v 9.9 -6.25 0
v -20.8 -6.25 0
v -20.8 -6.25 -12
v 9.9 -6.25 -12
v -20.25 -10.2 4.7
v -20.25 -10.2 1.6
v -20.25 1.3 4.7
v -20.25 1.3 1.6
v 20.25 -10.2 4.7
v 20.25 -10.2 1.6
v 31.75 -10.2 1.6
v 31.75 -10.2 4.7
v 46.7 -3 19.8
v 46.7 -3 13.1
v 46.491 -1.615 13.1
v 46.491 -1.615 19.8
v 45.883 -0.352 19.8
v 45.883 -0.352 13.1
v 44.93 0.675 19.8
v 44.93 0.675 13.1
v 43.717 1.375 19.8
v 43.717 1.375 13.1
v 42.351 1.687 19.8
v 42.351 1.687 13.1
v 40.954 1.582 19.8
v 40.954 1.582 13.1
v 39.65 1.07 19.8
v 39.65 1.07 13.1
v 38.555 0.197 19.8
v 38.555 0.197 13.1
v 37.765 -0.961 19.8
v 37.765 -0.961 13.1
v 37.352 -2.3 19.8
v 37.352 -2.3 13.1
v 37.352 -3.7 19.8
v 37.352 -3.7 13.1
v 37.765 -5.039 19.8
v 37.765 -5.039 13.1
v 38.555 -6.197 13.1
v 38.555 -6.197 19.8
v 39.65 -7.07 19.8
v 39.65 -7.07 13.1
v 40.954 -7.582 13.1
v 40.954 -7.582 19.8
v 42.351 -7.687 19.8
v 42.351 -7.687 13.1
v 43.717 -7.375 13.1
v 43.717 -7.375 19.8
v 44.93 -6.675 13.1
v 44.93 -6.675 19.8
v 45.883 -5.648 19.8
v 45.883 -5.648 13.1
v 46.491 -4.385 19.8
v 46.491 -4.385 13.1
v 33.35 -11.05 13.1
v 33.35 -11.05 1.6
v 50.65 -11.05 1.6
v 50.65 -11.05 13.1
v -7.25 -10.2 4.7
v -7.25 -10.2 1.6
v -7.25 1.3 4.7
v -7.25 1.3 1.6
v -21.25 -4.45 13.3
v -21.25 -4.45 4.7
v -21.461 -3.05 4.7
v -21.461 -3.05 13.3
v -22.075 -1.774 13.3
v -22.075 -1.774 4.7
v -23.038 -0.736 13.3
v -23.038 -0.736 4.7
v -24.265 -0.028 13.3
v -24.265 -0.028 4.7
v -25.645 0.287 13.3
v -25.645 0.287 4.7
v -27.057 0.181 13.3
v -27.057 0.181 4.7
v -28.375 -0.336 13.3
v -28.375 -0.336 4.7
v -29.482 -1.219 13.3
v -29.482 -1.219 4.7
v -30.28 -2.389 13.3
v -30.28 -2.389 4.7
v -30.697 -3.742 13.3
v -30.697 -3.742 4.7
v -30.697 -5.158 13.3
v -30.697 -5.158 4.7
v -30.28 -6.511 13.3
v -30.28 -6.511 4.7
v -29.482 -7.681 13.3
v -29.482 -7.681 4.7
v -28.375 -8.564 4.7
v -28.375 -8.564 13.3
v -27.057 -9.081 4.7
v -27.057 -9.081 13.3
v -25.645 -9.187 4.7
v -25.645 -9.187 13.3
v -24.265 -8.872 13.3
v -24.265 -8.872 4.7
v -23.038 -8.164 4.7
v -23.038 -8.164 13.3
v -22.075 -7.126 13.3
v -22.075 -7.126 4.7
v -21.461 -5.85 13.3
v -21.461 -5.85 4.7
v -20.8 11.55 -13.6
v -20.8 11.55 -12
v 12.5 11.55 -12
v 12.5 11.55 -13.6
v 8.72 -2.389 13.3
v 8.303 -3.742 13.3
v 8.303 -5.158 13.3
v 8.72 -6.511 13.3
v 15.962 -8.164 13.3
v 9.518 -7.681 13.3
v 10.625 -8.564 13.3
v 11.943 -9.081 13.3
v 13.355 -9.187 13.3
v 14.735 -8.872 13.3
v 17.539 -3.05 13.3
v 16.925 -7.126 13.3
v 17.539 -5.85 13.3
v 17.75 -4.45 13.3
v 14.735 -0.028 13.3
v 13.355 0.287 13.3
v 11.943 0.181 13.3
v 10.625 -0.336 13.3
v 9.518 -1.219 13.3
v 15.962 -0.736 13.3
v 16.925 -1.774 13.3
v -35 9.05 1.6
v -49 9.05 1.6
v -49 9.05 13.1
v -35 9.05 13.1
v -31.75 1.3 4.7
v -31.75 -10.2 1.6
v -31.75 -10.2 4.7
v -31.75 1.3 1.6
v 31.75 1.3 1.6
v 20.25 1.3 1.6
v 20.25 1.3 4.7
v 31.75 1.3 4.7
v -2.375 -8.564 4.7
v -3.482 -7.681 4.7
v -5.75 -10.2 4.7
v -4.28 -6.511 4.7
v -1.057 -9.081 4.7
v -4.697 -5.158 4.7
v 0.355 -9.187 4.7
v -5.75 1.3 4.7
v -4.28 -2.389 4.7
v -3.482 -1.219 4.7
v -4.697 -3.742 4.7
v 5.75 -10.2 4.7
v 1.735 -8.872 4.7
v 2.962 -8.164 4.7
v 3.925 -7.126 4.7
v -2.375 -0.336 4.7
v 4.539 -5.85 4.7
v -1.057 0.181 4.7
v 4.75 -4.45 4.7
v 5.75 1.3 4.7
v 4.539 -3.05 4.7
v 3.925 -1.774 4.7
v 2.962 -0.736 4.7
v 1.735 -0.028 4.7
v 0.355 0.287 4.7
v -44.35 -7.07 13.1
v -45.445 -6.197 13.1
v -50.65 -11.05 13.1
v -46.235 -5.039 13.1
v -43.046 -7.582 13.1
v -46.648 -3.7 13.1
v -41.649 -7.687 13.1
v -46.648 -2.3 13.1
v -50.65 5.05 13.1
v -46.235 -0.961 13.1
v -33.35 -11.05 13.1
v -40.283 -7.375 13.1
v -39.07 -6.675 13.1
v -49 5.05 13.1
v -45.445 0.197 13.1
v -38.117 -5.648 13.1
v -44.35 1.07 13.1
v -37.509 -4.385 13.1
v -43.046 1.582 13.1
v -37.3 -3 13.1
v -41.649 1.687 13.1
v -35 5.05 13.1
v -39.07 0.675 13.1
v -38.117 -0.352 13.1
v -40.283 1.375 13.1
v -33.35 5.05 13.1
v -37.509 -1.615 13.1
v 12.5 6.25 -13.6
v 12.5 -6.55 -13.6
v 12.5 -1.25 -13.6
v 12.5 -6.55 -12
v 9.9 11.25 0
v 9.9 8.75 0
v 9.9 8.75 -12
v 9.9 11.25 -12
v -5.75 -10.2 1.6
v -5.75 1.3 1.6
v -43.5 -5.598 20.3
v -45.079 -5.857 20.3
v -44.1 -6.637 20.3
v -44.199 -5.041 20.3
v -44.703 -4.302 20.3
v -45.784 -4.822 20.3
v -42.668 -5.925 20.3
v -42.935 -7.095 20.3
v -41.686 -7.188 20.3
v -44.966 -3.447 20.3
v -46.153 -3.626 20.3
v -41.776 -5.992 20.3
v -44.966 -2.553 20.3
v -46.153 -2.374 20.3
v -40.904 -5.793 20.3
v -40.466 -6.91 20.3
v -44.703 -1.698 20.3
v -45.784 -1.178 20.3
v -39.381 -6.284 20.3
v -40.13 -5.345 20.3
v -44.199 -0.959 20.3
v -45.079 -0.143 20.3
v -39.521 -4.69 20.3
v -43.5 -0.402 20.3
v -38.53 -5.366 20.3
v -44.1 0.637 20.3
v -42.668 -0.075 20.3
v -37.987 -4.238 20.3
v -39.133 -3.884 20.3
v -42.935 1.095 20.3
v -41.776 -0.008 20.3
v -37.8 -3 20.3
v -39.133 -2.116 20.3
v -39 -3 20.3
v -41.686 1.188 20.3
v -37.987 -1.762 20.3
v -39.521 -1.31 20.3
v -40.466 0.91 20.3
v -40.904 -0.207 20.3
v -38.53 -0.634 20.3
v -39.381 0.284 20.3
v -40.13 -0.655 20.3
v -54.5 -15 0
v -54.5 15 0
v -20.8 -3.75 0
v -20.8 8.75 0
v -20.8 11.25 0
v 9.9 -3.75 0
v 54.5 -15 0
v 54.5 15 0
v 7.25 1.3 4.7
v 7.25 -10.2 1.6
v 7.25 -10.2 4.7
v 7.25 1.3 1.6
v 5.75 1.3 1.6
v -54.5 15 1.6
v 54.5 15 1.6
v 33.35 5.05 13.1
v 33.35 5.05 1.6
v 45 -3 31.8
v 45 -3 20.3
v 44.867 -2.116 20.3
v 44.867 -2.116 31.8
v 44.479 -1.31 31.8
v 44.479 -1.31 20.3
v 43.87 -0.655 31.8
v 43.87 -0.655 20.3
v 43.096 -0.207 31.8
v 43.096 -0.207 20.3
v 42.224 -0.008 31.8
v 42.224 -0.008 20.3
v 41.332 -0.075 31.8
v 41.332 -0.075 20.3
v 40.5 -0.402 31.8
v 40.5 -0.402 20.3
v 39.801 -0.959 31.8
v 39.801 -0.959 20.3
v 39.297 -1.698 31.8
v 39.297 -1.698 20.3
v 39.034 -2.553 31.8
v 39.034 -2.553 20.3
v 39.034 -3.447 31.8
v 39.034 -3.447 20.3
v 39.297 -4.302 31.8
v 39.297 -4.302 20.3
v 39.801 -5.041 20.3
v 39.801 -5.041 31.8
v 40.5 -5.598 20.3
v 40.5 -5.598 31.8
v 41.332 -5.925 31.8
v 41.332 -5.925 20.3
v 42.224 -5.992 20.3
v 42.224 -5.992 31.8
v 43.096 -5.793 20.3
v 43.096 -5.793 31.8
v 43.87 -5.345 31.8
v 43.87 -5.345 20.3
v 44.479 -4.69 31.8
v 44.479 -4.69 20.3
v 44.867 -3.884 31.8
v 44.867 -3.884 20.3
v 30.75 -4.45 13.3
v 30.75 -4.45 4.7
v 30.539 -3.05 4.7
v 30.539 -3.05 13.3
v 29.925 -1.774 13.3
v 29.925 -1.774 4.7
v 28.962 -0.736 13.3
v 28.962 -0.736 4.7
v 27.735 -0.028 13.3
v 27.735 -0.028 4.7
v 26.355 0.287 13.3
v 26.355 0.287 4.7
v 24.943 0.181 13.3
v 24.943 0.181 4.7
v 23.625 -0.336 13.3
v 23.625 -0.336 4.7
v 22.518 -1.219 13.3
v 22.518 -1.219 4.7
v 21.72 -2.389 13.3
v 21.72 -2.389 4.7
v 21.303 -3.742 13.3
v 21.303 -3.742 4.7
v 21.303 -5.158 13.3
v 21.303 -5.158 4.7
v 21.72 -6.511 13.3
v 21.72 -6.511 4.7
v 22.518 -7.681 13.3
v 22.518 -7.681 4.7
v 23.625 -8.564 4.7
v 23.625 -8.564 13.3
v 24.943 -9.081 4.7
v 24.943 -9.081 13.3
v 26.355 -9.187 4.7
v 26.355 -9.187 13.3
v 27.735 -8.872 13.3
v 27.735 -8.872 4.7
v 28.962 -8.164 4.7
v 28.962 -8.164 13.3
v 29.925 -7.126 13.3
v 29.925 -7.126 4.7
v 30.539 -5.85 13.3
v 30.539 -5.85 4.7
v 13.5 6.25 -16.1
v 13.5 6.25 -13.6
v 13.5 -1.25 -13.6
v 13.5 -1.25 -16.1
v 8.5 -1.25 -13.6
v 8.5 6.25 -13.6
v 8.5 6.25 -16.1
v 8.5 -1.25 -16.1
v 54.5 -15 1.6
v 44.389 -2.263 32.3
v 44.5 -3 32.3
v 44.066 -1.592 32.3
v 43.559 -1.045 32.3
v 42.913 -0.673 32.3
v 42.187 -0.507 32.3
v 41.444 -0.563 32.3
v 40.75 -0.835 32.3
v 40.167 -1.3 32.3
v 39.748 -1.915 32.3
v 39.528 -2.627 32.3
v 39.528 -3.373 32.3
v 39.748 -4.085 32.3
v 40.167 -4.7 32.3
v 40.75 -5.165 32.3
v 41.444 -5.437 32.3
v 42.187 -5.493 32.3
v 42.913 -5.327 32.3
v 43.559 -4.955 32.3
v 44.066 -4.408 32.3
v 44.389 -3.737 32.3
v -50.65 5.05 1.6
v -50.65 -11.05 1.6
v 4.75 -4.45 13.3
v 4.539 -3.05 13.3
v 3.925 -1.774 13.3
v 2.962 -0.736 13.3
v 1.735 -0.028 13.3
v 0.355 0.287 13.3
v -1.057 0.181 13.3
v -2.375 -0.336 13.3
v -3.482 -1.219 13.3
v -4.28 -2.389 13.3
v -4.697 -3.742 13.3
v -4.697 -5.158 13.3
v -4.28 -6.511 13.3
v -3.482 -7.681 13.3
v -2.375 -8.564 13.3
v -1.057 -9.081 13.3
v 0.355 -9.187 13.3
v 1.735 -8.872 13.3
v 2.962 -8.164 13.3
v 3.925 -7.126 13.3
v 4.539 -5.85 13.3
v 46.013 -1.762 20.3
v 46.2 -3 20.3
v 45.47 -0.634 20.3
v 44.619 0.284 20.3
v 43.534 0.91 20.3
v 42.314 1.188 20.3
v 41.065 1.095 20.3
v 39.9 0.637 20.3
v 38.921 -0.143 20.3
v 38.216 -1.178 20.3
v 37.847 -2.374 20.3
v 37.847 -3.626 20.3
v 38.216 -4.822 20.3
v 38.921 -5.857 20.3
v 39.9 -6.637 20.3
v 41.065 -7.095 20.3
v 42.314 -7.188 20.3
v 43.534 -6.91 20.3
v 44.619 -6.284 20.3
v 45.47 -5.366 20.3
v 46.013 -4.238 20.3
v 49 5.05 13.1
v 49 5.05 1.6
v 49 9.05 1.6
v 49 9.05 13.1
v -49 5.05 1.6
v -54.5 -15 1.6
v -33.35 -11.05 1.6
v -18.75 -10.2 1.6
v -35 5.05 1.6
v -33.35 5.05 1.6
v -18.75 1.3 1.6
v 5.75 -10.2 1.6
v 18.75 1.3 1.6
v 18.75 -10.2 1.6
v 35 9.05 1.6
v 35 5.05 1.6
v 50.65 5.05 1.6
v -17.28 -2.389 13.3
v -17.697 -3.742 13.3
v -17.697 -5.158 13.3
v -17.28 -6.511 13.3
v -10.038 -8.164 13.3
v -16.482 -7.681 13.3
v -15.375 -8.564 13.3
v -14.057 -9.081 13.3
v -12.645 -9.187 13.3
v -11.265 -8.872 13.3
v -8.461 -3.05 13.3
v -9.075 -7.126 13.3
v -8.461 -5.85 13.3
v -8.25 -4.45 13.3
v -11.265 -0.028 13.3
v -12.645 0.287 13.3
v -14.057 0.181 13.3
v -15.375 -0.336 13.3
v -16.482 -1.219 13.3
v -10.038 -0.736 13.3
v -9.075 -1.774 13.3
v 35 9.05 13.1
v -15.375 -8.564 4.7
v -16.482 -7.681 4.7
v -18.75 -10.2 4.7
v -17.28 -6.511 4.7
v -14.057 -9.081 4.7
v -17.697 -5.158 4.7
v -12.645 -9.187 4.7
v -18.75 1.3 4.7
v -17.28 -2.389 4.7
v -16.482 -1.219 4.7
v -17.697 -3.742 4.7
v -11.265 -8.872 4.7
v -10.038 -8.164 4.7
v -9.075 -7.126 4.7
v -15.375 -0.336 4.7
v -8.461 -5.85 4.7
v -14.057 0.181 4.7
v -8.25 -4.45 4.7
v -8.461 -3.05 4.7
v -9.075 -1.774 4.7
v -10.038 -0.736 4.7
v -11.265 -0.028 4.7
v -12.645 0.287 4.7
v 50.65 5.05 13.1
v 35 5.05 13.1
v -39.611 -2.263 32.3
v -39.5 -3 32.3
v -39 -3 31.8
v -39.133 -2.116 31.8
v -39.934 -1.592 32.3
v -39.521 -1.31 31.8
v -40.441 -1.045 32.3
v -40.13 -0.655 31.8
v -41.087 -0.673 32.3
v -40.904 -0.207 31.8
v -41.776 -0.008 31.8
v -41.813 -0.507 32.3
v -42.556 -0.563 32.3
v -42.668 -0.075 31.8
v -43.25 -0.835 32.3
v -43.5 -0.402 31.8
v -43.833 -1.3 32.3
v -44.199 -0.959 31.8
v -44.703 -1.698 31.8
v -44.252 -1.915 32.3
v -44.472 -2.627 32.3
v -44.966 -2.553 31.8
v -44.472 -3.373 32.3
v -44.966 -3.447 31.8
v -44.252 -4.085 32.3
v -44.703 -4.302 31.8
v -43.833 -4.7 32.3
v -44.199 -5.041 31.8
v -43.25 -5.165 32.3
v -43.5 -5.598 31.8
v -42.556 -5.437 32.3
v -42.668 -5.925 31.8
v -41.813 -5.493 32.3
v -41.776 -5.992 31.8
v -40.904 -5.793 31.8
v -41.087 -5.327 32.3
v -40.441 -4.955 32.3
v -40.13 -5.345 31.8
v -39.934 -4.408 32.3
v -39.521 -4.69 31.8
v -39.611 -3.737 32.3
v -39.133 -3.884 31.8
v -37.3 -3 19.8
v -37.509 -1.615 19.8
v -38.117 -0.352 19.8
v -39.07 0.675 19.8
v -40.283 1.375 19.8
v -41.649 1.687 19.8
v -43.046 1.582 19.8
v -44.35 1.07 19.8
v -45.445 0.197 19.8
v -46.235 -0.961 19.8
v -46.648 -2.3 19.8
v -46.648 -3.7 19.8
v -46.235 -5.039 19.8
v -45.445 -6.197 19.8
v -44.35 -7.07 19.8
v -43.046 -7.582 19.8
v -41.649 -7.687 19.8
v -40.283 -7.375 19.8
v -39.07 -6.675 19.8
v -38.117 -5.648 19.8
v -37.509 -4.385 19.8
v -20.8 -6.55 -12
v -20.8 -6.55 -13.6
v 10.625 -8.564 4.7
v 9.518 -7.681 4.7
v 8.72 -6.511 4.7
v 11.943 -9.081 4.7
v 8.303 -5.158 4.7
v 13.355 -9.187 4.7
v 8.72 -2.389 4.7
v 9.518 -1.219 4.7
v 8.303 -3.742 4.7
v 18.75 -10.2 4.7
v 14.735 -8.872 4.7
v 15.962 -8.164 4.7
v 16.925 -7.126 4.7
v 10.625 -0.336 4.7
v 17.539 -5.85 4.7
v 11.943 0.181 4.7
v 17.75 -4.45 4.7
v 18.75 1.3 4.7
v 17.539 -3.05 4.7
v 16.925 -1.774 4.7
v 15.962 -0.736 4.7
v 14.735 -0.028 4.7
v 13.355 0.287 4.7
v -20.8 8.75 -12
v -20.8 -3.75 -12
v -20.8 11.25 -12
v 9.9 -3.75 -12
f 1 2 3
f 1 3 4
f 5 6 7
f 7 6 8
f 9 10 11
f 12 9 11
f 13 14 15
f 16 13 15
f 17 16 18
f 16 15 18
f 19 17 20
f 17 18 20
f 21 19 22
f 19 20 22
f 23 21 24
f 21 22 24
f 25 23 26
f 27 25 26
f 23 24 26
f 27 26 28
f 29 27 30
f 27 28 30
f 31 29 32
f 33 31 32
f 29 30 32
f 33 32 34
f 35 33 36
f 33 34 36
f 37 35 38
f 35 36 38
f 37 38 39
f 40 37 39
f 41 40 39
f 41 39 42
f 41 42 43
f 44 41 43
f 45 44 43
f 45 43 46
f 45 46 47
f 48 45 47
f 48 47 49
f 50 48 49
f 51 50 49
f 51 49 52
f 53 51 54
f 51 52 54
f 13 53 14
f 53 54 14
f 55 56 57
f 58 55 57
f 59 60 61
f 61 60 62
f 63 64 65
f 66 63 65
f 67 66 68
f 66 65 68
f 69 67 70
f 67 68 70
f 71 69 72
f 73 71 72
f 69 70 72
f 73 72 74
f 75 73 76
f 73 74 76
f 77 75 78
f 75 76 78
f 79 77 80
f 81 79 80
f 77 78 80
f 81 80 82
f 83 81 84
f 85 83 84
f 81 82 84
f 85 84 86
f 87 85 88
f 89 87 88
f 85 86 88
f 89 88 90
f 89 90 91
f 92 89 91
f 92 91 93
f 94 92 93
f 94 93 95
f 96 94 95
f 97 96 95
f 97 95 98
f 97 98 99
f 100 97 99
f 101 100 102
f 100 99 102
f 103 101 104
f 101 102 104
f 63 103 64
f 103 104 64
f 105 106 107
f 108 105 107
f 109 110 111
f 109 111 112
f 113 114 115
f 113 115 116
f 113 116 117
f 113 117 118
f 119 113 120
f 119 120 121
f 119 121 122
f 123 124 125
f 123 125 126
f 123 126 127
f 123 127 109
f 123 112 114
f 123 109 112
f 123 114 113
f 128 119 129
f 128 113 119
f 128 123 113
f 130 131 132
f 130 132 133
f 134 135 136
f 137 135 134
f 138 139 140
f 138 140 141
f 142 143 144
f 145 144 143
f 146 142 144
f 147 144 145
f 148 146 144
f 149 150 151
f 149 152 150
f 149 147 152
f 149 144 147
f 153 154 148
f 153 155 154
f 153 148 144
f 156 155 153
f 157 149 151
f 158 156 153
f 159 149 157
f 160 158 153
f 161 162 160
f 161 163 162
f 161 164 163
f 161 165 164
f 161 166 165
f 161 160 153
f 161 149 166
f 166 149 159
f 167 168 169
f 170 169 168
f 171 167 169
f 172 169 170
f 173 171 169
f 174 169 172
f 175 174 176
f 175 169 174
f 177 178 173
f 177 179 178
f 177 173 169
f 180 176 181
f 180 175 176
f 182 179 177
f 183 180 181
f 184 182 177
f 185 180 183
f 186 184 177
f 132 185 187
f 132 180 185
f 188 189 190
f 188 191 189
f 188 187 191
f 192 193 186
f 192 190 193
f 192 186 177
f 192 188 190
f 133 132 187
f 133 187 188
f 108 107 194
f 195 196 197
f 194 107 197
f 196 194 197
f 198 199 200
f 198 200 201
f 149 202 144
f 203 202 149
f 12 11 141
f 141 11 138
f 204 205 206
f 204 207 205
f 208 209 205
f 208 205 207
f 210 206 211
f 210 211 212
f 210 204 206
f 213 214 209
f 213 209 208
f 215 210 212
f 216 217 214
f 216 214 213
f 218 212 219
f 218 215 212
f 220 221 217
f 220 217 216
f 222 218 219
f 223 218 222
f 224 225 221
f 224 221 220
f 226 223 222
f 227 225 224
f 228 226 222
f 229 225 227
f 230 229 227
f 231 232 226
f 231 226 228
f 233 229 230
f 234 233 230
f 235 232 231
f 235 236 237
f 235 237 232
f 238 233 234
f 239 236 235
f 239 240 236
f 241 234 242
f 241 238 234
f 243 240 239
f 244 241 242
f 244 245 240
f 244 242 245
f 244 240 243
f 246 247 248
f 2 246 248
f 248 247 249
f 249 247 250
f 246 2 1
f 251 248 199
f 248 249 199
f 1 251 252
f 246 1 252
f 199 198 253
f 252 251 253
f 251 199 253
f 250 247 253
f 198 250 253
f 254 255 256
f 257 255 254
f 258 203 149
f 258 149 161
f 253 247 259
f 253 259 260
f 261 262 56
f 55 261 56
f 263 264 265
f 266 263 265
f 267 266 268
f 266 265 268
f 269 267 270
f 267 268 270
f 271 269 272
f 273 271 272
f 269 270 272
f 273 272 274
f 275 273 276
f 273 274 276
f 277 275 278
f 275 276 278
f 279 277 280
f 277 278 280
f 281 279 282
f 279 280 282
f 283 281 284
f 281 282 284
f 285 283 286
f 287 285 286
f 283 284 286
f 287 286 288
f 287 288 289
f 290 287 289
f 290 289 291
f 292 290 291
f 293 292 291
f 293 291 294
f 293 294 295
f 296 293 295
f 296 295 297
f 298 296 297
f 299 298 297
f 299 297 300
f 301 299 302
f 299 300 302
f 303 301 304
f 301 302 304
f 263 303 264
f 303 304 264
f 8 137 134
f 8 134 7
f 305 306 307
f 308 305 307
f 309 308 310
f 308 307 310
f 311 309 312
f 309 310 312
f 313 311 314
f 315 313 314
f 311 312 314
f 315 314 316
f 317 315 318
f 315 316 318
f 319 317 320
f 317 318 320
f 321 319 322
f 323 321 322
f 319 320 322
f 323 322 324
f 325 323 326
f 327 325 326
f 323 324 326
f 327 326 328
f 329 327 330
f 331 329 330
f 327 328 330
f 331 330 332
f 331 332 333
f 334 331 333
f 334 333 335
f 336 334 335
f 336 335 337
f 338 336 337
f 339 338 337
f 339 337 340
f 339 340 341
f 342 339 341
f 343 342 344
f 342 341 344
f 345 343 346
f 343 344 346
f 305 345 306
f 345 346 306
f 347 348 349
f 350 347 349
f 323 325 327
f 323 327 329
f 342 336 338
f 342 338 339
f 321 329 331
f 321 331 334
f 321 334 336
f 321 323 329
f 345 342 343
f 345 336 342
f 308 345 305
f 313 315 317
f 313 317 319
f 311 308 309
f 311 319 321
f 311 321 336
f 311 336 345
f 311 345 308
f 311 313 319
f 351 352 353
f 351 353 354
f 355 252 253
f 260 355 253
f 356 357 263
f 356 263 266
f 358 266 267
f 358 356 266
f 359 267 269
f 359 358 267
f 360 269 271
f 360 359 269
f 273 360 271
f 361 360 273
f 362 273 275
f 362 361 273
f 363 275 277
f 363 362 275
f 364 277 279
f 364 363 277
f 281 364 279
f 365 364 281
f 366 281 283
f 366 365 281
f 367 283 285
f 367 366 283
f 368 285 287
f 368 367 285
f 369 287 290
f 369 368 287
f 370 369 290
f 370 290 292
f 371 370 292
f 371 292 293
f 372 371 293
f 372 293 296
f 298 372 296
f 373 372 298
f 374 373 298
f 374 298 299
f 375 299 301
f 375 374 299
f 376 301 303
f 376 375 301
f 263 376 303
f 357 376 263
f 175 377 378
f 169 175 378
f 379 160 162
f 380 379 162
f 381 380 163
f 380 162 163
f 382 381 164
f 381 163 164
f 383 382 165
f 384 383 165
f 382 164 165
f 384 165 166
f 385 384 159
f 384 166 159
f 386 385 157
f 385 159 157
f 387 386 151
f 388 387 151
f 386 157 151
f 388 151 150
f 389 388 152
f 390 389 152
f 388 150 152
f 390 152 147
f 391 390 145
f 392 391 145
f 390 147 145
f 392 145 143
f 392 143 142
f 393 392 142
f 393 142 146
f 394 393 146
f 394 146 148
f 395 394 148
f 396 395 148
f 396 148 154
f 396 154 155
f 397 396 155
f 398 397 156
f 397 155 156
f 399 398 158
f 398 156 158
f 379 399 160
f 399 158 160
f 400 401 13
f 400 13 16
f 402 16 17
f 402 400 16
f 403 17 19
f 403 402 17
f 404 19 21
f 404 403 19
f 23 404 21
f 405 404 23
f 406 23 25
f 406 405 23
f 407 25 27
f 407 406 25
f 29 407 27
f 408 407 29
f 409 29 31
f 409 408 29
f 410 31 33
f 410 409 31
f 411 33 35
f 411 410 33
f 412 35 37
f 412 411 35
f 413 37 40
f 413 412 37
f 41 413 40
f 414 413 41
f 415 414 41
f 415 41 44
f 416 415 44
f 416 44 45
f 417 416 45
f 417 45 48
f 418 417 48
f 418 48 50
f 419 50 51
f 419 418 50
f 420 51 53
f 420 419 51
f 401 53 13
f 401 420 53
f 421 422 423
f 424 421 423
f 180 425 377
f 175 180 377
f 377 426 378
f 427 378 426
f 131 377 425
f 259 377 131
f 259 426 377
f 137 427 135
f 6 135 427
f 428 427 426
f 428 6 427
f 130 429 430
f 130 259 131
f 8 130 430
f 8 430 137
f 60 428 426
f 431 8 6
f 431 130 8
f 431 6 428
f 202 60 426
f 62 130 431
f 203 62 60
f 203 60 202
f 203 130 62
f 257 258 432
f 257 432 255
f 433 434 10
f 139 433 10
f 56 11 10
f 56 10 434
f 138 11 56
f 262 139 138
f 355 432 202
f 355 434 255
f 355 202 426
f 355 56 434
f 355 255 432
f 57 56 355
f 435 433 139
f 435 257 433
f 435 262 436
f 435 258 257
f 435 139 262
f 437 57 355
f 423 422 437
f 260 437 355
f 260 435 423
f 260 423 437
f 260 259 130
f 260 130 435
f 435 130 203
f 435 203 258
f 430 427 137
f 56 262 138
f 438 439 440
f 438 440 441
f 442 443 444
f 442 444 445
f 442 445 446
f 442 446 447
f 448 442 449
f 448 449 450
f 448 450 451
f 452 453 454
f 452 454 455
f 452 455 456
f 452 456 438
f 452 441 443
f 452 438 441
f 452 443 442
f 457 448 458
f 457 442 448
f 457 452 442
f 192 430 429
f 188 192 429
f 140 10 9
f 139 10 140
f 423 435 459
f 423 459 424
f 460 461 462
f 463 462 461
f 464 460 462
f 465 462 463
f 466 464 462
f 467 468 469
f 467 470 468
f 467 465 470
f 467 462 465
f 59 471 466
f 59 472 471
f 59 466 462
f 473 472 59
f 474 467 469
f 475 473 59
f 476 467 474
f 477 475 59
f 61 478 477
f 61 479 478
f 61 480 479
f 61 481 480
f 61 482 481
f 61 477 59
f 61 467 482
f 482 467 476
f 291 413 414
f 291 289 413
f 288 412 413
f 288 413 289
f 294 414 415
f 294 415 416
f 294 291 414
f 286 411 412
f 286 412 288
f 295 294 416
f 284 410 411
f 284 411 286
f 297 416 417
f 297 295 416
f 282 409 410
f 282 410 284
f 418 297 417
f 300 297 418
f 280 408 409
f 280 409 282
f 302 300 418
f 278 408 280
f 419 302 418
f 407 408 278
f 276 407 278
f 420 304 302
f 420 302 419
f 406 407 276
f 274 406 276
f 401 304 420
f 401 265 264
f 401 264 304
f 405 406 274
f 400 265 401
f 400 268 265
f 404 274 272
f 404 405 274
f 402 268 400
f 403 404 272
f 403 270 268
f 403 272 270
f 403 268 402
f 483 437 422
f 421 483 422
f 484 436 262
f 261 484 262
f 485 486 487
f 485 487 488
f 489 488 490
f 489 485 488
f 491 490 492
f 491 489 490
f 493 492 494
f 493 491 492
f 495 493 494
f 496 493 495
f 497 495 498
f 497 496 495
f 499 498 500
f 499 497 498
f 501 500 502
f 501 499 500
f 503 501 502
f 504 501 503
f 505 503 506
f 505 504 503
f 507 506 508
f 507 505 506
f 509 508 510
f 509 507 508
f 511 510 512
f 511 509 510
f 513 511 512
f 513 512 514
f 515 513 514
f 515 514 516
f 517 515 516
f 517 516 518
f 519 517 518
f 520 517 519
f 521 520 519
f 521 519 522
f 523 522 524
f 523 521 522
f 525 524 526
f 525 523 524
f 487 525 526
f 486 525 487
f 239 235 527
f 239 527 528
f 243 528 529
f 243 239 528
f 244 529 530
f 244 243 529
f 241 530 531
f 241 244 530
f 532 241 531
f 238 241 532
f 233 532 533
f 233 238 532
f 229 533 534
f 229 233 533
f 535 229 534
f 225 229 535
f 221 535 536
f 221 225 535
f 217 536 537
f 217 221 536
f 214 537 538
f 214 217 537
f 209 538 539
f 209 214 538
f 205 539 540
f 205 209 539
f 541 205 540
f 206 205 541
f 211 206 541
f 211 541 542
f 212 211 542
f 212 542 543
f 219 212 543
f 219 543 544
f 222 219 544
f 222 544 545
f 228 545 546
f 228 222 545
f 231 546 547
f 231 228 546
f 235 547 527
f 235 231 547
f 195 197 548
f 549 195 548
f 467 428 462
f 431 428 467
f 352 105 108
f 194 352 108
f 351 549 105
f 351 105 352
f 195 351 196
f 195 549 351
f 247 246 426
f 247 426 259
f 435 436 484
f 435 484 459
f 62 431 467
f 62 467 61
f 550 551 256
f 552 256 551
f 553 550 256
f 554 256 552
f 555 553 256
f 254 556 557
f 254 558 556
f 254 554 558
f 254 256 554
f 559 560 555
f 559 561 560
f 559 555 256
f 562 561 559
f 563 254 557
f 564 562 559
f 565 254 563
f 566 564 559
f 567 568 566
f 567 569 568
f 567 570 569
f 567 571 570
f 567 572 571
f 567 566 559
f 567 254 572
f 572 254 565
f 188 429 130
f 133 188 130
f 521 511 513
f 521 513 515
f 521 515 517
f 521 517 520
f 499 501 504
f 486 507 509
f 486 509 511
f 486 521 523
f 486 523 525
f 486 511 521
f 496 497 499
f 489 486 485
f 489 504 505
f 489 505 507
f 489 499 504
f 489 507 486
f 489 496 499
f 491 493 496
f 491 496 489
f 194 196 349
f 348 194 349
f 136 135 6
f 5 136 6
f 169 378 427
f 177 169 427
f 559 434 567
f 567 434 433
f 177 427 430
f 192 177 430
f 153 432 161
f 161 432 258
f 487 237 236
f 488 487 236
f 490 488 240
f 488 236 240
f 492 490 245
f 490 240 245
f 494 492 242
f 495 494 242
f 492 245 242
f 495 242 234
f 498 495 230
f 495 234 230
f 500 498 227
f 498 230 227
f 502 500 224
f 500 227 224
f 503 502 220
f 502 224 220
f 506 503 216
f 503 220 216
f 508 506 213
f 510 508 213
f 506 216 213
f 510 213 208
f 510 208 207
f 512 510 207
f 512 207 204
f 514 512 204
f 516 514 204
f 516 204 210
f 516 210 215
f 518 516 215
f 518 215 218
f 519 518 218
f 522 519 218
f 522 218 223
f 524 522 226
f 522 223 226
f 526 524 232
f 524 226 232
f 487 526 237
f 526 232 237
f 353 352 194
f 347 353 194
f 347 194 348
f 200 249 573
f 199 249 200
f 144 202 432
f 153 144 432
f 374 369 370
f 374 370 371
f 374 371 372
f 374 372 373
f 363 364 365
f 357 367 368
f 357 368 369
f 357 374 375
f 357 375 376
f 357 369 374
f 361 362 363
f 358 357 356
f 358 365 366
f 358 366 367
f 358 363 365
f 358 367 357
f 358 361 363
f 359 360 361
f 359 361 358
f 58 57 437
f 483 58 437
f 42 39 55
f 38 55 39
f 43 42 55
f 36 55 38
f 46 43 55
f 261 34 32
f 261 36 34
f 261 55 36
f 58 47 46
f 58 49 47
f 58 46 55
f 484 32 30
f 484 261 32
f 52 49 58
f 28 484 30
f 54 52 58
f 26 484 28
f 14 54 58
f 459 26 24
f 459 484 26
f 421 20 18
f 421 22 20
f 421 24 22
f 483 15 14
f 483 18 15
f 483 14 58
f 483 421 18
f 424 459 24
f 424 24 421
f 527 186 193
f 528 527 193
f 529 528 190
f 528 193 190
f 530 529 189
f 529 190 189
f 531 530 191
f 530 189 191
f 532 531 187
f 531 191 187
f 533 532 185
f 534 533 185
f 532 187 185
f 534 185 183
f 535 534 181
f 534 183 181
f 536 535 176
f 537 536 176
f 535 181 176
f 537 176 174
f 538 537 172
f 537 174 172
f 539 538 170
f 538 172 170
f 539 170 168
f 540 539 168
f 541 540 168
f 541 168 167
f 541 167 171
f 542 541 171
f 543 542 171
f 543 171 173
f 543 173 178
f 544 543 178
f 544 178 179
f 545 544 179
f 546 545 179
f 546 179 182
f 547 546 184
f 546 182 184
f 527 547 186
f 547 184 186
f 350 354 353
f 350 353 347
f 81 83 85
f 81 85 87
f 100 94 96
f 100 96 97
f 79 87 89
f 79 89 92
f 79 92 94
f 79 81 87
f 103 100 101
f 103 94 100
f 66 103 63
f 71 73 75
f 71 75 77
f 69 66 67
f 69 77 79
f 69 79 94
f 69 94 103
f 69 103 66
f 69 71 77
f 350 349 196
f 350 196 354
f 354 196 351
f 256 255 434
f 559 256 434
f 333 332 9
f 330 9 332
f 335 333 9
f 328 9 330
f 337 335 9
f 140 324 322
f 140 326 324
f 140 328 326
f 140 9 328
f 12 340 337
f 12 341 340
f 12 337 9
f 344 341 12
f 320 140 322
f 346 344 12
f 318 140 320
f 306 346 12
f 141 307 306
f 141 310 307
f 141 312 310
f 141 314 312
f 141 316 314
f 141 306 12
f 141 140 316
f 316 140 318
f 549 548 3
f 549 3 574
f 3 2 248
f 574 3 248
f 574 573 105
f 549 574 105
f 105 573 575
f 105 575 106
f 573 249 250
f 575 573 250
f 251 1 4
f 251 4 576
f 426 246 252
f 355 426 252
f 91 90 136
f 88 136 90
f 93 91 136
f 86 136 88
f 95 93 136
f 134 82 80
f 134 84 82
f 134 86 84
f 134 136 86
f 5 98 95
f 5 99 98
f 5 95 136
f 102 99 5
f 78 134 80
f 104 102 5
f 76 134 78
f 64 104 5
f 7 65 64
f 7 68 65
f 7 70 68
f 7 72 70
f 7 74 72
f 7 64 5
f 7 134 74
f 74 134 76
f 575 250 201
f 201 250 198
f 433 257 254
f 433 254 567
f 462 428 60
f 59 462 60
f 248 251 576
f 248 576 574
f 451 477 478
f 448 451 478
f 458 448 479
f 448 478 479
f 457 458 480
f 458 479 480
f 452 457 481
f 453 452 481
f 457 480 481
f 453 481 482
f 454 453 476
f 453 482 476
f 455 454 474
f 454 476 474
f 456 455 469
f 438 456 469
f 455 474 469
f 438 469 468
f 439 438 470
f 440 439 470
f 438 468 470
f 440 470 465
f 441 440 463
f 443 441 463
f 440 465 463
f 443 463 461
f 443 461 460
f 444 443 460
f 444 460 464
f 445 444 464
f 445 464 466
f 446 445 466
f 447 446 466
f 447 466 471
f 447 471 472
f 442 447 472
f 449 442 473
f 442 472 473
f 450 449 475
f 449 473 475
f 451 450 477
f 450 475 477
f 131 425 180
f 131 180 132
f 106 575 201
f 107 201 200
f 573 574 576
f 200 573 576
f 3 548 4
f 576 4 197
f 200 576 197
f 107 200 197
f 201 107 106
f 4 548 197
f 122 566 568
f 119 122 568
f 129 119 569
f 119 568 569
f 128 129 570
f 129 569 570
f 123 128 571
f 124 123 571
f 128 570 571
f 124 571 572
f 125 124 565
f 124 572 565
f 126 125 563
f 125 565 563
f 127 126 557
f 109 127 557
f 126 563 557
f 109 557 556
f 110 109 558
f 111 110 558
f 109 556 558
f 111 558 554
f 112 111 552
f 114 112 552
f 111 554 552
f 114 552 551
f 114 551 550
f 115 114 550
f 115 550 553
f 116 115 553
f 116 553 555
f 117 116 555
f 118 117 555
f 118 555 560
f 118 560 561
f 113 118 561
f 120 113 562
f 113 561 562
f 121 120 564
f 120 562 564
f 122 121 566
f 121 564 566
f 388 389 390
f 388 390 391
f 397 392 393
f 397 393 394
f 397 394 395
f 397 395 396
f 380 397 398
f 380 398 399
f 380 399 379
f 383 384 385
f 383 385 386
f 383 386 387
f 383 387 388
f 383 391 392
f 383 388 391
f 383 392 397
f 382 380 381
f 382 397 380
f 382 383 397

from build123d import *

# Parameters (mm, degrees)
F0_W      = 11.5
F0_H      = 11.5
F1_DEPTH  = 4.7
F0_W_2    = 109
F0_H_2    = 30
F2_DEPTH  = 1.6
F3_R      = 4.75
F4_DEPTH  = 8.6
F5_W      = 14
F5_H      = 4
F6_DEPTH  = 11.5
F7_R      = 4.7
F8_DEPTH  = 7.2
F9_R      = 3
F10_DEPTH = 12
F11_SIZE  = 0.5
F12_W     = 1.5
F12_H     = 2.5
F12_W_2   = 11.5
F12_W_3   = 2.65
F12_W_4   = 0.55
F12_W_5   = 30.7
F13_DEPTH = 12
F14_W     = 30.7
F14_H     = 2.5
F15_DEPTH = 1.6
F16_W     = 4
F16_H     = 7.5
F16_W_2   = 1
F17_DEPTH = 2.5


with BuildPart() as f1:
    # F0 (on Top) → F1 (new body)
    with BuildSketch(Plane.XY):
        with Locations((-26, -4.45)):
            Rectangle(F0_W, F0_H)
    extrude(amount=F1_DEPTH)



with BuildPart() as f1b:
    # F0 (on Top) → F1, piece 2 (new body)
    with BuildSketch(Plane.XY):
        with Locations((-13, -4.45)):
            Rectangle(F0_W, F0_H)
    extrude(amount=F1_DEPTH)


with BuildPart() as f1c:
    # F0 (on Top) → F1, piece 3 (new body)
    with BuildSketch(Plane.XY):
        with Locations((13, -4.45)):
            Rectangle(F0_W, F0_H)
    extrude(amount=F1_DEPTH)


with BuildPart() as f1d:
    # F0 (on Top) → F1, piece 4 (new body)
    with BuildSketch(Plane.XY):
        with Locations((26, -4.45)):
            Rectangle(F0_W, F0_H)
    extrude(amount=F1_DEPTH)


with BuildPart() as f1e:
    # F0 (on Top) → F1, piece 5 (new body)
    with BuildSketch(Plane.XY):
        with Locations((0, -4.45)):
            Rectangle(F0_W, F0_H)
    extrude(amount=F1_DEPTH)


with BuildPart() as f1_1:
    add(f1.part)

    add(f1b.part)  # F2 merges F1b

    add(f1c.part)  # F2 merges F1c

    add(f1d.part)  # F2 merges F1d

    add(f1e.part)  # F2 merges F1e
    # F0 (on Top) → F2 (join)
    with BuildSketch(Plane.XY):
        Rectangle(F0_W_2, F0_H_2)
        with Locations((-26, -4.45)):
            Rectangle(F0_W, F0_H, mode=Mode.SUBTRACT)
        with Locations((-13, -4.45)):
            Rectangle(F0_W, F0_H, mode=Mode.SUBTRACT)
        with Locations((0, -4.45)):
            Rectangle(F0_W, F0_H, mode=Mode.SUBTRACT)
        with Locations((13, -4.45)):
            Rectangle(F0_W, F0_H, mode=Mode.SUBTRACT)
        with Locations((26, -4.45)):
            Rectangle(F0_W, F0_H, mode=Mode.SUBTRACT)
    extrude(amount=F2_DEPTH)

    # F3 (on face) → F4 (join)
    with BuildSketch(Plane.XY.offset(4.7)):
        with Locations((-26, -4.45)):
            Circle(F3_R)
        with Locations((-13, -4.45)):
            Circle(F3_R)
        with Locations((0, -4.45)):
            Circle(F3_R)
        with Locations((13, -4.45)):
            Circle(F3_R)
        with Locations((26, -4.45)):
            Circle(F3_R)
    extrude(amount=F4_DEPTH)

    # F5 (on face) → F6 (join)
    with BuildSketch(Plane.XY.offset(1.6)):
        Polygon((-50.65, -11.05), (-33.35, -11.05), (-33.35, 5.05), (-35, 5.05), (-49, 5.05), (-50.65, 5.05), align=None)
        with Locations((-42, 7.05)):
            Rectangle(F5_W, F5_H)
        with Locations((42, 7.05)):
            Rectangle(F5_W, F5_H)
        Polygon((33.35, -11.05), (50.65, -11.05), (50.65, 5.05), (49, 5.05), (35, 5.05), (33.35, 5.05), align=None)
    extrude(amount=F6_DEPTH)

    # F7 (on face) → F8 (join)
    with BuildSketch(Plane.XY.offset(13.1)):
        with Locations((-42, -3)):
            Circle(F7_R)
        with Locations((42, -3)):
            Circle(F7_R)
    extrude(amount=F8_DEPTH)

    # F9 (on face) → F10 (join)
    with BuildSketch(Plane.XY.offset(20.3)):
        with Locations((-42, -3)):
            Circle(F9_R)
        with Locations((42, -3)):
            Circle(F9_R)
    extrude(amount=F10_DEPTH)

    # F11
    f11_edges = [f1_1.edges().sort_by_distance(p)[0] for p in [
        (-46.7, -3, 20.3),
        (37.3, -3, 20.3),
        (-45, -3, 32.3),
        (39, -3, 32.3),
    ]]
    chamfer(f11_edges, length=F11_SIZE)

    # F12 (on face) → F13 (join)
    with BuildSketch(Plane.XY):
        with Locations((-19.5, -5)):
            Rectangle(F12_W, F12_H)
        with Locations((-13, -5)):
            Rectangle(F12_W_2, F12_H)
        with Locations((-6.5, -5)):
            Rectangle(F12_W, F12_H)
        with Locations((0, -5)):
            Rectangle(F12_W_2, F12_H)
        with Locations((6.5, -5)):
            Rectangle(F12_W, F12_H)
        with Locations((8.575, -5)):
            Rectangle(F12_W_3, F12_H)
        with Locations((-20.525, -5)):
            Rectangle(F12_W_4, F12_H)
        with Locations((-5.45, 10)):
            Rectangle(F12_W_5, F12_H)
    extrude(amount=-F13_DEPTH)

    # F14 (on face) → F15 (join)
    with BuildSketch(Plane(origin=(0, 0, -12), x_dir=(1, 0, 0), z_dir=(0, 0, -1))):
        Polygon((-20.8, -11.25), (-20.8, -11.55), (12.5, -11.55), (12.5, 6.55), (-20.8, 6.55), (-20.8, -8.75), (9.9, -8.75), (9.9, -11.25), align=None)
        with Locations((-5.45, -10)):
            Rectangle(F14_W, F14_H)
    extrude(amount=F15_DEPTH)

    # F16 (on face) → F17 (join)
    with BuildSketch(Plane(origin=(0, 0, -13.6), x_dir=(1, 0, 0), z_dir=(0, 0, -1))):
        with Locations((10.5, -2.5)):
            Rectangle(F16_W, F16_H)
        with Locations((13, -2.5)):
            Rectangle(F16_W_2, F16_H)
    extrude(amount=F17_DEPTH)


solid = f1_1.part
